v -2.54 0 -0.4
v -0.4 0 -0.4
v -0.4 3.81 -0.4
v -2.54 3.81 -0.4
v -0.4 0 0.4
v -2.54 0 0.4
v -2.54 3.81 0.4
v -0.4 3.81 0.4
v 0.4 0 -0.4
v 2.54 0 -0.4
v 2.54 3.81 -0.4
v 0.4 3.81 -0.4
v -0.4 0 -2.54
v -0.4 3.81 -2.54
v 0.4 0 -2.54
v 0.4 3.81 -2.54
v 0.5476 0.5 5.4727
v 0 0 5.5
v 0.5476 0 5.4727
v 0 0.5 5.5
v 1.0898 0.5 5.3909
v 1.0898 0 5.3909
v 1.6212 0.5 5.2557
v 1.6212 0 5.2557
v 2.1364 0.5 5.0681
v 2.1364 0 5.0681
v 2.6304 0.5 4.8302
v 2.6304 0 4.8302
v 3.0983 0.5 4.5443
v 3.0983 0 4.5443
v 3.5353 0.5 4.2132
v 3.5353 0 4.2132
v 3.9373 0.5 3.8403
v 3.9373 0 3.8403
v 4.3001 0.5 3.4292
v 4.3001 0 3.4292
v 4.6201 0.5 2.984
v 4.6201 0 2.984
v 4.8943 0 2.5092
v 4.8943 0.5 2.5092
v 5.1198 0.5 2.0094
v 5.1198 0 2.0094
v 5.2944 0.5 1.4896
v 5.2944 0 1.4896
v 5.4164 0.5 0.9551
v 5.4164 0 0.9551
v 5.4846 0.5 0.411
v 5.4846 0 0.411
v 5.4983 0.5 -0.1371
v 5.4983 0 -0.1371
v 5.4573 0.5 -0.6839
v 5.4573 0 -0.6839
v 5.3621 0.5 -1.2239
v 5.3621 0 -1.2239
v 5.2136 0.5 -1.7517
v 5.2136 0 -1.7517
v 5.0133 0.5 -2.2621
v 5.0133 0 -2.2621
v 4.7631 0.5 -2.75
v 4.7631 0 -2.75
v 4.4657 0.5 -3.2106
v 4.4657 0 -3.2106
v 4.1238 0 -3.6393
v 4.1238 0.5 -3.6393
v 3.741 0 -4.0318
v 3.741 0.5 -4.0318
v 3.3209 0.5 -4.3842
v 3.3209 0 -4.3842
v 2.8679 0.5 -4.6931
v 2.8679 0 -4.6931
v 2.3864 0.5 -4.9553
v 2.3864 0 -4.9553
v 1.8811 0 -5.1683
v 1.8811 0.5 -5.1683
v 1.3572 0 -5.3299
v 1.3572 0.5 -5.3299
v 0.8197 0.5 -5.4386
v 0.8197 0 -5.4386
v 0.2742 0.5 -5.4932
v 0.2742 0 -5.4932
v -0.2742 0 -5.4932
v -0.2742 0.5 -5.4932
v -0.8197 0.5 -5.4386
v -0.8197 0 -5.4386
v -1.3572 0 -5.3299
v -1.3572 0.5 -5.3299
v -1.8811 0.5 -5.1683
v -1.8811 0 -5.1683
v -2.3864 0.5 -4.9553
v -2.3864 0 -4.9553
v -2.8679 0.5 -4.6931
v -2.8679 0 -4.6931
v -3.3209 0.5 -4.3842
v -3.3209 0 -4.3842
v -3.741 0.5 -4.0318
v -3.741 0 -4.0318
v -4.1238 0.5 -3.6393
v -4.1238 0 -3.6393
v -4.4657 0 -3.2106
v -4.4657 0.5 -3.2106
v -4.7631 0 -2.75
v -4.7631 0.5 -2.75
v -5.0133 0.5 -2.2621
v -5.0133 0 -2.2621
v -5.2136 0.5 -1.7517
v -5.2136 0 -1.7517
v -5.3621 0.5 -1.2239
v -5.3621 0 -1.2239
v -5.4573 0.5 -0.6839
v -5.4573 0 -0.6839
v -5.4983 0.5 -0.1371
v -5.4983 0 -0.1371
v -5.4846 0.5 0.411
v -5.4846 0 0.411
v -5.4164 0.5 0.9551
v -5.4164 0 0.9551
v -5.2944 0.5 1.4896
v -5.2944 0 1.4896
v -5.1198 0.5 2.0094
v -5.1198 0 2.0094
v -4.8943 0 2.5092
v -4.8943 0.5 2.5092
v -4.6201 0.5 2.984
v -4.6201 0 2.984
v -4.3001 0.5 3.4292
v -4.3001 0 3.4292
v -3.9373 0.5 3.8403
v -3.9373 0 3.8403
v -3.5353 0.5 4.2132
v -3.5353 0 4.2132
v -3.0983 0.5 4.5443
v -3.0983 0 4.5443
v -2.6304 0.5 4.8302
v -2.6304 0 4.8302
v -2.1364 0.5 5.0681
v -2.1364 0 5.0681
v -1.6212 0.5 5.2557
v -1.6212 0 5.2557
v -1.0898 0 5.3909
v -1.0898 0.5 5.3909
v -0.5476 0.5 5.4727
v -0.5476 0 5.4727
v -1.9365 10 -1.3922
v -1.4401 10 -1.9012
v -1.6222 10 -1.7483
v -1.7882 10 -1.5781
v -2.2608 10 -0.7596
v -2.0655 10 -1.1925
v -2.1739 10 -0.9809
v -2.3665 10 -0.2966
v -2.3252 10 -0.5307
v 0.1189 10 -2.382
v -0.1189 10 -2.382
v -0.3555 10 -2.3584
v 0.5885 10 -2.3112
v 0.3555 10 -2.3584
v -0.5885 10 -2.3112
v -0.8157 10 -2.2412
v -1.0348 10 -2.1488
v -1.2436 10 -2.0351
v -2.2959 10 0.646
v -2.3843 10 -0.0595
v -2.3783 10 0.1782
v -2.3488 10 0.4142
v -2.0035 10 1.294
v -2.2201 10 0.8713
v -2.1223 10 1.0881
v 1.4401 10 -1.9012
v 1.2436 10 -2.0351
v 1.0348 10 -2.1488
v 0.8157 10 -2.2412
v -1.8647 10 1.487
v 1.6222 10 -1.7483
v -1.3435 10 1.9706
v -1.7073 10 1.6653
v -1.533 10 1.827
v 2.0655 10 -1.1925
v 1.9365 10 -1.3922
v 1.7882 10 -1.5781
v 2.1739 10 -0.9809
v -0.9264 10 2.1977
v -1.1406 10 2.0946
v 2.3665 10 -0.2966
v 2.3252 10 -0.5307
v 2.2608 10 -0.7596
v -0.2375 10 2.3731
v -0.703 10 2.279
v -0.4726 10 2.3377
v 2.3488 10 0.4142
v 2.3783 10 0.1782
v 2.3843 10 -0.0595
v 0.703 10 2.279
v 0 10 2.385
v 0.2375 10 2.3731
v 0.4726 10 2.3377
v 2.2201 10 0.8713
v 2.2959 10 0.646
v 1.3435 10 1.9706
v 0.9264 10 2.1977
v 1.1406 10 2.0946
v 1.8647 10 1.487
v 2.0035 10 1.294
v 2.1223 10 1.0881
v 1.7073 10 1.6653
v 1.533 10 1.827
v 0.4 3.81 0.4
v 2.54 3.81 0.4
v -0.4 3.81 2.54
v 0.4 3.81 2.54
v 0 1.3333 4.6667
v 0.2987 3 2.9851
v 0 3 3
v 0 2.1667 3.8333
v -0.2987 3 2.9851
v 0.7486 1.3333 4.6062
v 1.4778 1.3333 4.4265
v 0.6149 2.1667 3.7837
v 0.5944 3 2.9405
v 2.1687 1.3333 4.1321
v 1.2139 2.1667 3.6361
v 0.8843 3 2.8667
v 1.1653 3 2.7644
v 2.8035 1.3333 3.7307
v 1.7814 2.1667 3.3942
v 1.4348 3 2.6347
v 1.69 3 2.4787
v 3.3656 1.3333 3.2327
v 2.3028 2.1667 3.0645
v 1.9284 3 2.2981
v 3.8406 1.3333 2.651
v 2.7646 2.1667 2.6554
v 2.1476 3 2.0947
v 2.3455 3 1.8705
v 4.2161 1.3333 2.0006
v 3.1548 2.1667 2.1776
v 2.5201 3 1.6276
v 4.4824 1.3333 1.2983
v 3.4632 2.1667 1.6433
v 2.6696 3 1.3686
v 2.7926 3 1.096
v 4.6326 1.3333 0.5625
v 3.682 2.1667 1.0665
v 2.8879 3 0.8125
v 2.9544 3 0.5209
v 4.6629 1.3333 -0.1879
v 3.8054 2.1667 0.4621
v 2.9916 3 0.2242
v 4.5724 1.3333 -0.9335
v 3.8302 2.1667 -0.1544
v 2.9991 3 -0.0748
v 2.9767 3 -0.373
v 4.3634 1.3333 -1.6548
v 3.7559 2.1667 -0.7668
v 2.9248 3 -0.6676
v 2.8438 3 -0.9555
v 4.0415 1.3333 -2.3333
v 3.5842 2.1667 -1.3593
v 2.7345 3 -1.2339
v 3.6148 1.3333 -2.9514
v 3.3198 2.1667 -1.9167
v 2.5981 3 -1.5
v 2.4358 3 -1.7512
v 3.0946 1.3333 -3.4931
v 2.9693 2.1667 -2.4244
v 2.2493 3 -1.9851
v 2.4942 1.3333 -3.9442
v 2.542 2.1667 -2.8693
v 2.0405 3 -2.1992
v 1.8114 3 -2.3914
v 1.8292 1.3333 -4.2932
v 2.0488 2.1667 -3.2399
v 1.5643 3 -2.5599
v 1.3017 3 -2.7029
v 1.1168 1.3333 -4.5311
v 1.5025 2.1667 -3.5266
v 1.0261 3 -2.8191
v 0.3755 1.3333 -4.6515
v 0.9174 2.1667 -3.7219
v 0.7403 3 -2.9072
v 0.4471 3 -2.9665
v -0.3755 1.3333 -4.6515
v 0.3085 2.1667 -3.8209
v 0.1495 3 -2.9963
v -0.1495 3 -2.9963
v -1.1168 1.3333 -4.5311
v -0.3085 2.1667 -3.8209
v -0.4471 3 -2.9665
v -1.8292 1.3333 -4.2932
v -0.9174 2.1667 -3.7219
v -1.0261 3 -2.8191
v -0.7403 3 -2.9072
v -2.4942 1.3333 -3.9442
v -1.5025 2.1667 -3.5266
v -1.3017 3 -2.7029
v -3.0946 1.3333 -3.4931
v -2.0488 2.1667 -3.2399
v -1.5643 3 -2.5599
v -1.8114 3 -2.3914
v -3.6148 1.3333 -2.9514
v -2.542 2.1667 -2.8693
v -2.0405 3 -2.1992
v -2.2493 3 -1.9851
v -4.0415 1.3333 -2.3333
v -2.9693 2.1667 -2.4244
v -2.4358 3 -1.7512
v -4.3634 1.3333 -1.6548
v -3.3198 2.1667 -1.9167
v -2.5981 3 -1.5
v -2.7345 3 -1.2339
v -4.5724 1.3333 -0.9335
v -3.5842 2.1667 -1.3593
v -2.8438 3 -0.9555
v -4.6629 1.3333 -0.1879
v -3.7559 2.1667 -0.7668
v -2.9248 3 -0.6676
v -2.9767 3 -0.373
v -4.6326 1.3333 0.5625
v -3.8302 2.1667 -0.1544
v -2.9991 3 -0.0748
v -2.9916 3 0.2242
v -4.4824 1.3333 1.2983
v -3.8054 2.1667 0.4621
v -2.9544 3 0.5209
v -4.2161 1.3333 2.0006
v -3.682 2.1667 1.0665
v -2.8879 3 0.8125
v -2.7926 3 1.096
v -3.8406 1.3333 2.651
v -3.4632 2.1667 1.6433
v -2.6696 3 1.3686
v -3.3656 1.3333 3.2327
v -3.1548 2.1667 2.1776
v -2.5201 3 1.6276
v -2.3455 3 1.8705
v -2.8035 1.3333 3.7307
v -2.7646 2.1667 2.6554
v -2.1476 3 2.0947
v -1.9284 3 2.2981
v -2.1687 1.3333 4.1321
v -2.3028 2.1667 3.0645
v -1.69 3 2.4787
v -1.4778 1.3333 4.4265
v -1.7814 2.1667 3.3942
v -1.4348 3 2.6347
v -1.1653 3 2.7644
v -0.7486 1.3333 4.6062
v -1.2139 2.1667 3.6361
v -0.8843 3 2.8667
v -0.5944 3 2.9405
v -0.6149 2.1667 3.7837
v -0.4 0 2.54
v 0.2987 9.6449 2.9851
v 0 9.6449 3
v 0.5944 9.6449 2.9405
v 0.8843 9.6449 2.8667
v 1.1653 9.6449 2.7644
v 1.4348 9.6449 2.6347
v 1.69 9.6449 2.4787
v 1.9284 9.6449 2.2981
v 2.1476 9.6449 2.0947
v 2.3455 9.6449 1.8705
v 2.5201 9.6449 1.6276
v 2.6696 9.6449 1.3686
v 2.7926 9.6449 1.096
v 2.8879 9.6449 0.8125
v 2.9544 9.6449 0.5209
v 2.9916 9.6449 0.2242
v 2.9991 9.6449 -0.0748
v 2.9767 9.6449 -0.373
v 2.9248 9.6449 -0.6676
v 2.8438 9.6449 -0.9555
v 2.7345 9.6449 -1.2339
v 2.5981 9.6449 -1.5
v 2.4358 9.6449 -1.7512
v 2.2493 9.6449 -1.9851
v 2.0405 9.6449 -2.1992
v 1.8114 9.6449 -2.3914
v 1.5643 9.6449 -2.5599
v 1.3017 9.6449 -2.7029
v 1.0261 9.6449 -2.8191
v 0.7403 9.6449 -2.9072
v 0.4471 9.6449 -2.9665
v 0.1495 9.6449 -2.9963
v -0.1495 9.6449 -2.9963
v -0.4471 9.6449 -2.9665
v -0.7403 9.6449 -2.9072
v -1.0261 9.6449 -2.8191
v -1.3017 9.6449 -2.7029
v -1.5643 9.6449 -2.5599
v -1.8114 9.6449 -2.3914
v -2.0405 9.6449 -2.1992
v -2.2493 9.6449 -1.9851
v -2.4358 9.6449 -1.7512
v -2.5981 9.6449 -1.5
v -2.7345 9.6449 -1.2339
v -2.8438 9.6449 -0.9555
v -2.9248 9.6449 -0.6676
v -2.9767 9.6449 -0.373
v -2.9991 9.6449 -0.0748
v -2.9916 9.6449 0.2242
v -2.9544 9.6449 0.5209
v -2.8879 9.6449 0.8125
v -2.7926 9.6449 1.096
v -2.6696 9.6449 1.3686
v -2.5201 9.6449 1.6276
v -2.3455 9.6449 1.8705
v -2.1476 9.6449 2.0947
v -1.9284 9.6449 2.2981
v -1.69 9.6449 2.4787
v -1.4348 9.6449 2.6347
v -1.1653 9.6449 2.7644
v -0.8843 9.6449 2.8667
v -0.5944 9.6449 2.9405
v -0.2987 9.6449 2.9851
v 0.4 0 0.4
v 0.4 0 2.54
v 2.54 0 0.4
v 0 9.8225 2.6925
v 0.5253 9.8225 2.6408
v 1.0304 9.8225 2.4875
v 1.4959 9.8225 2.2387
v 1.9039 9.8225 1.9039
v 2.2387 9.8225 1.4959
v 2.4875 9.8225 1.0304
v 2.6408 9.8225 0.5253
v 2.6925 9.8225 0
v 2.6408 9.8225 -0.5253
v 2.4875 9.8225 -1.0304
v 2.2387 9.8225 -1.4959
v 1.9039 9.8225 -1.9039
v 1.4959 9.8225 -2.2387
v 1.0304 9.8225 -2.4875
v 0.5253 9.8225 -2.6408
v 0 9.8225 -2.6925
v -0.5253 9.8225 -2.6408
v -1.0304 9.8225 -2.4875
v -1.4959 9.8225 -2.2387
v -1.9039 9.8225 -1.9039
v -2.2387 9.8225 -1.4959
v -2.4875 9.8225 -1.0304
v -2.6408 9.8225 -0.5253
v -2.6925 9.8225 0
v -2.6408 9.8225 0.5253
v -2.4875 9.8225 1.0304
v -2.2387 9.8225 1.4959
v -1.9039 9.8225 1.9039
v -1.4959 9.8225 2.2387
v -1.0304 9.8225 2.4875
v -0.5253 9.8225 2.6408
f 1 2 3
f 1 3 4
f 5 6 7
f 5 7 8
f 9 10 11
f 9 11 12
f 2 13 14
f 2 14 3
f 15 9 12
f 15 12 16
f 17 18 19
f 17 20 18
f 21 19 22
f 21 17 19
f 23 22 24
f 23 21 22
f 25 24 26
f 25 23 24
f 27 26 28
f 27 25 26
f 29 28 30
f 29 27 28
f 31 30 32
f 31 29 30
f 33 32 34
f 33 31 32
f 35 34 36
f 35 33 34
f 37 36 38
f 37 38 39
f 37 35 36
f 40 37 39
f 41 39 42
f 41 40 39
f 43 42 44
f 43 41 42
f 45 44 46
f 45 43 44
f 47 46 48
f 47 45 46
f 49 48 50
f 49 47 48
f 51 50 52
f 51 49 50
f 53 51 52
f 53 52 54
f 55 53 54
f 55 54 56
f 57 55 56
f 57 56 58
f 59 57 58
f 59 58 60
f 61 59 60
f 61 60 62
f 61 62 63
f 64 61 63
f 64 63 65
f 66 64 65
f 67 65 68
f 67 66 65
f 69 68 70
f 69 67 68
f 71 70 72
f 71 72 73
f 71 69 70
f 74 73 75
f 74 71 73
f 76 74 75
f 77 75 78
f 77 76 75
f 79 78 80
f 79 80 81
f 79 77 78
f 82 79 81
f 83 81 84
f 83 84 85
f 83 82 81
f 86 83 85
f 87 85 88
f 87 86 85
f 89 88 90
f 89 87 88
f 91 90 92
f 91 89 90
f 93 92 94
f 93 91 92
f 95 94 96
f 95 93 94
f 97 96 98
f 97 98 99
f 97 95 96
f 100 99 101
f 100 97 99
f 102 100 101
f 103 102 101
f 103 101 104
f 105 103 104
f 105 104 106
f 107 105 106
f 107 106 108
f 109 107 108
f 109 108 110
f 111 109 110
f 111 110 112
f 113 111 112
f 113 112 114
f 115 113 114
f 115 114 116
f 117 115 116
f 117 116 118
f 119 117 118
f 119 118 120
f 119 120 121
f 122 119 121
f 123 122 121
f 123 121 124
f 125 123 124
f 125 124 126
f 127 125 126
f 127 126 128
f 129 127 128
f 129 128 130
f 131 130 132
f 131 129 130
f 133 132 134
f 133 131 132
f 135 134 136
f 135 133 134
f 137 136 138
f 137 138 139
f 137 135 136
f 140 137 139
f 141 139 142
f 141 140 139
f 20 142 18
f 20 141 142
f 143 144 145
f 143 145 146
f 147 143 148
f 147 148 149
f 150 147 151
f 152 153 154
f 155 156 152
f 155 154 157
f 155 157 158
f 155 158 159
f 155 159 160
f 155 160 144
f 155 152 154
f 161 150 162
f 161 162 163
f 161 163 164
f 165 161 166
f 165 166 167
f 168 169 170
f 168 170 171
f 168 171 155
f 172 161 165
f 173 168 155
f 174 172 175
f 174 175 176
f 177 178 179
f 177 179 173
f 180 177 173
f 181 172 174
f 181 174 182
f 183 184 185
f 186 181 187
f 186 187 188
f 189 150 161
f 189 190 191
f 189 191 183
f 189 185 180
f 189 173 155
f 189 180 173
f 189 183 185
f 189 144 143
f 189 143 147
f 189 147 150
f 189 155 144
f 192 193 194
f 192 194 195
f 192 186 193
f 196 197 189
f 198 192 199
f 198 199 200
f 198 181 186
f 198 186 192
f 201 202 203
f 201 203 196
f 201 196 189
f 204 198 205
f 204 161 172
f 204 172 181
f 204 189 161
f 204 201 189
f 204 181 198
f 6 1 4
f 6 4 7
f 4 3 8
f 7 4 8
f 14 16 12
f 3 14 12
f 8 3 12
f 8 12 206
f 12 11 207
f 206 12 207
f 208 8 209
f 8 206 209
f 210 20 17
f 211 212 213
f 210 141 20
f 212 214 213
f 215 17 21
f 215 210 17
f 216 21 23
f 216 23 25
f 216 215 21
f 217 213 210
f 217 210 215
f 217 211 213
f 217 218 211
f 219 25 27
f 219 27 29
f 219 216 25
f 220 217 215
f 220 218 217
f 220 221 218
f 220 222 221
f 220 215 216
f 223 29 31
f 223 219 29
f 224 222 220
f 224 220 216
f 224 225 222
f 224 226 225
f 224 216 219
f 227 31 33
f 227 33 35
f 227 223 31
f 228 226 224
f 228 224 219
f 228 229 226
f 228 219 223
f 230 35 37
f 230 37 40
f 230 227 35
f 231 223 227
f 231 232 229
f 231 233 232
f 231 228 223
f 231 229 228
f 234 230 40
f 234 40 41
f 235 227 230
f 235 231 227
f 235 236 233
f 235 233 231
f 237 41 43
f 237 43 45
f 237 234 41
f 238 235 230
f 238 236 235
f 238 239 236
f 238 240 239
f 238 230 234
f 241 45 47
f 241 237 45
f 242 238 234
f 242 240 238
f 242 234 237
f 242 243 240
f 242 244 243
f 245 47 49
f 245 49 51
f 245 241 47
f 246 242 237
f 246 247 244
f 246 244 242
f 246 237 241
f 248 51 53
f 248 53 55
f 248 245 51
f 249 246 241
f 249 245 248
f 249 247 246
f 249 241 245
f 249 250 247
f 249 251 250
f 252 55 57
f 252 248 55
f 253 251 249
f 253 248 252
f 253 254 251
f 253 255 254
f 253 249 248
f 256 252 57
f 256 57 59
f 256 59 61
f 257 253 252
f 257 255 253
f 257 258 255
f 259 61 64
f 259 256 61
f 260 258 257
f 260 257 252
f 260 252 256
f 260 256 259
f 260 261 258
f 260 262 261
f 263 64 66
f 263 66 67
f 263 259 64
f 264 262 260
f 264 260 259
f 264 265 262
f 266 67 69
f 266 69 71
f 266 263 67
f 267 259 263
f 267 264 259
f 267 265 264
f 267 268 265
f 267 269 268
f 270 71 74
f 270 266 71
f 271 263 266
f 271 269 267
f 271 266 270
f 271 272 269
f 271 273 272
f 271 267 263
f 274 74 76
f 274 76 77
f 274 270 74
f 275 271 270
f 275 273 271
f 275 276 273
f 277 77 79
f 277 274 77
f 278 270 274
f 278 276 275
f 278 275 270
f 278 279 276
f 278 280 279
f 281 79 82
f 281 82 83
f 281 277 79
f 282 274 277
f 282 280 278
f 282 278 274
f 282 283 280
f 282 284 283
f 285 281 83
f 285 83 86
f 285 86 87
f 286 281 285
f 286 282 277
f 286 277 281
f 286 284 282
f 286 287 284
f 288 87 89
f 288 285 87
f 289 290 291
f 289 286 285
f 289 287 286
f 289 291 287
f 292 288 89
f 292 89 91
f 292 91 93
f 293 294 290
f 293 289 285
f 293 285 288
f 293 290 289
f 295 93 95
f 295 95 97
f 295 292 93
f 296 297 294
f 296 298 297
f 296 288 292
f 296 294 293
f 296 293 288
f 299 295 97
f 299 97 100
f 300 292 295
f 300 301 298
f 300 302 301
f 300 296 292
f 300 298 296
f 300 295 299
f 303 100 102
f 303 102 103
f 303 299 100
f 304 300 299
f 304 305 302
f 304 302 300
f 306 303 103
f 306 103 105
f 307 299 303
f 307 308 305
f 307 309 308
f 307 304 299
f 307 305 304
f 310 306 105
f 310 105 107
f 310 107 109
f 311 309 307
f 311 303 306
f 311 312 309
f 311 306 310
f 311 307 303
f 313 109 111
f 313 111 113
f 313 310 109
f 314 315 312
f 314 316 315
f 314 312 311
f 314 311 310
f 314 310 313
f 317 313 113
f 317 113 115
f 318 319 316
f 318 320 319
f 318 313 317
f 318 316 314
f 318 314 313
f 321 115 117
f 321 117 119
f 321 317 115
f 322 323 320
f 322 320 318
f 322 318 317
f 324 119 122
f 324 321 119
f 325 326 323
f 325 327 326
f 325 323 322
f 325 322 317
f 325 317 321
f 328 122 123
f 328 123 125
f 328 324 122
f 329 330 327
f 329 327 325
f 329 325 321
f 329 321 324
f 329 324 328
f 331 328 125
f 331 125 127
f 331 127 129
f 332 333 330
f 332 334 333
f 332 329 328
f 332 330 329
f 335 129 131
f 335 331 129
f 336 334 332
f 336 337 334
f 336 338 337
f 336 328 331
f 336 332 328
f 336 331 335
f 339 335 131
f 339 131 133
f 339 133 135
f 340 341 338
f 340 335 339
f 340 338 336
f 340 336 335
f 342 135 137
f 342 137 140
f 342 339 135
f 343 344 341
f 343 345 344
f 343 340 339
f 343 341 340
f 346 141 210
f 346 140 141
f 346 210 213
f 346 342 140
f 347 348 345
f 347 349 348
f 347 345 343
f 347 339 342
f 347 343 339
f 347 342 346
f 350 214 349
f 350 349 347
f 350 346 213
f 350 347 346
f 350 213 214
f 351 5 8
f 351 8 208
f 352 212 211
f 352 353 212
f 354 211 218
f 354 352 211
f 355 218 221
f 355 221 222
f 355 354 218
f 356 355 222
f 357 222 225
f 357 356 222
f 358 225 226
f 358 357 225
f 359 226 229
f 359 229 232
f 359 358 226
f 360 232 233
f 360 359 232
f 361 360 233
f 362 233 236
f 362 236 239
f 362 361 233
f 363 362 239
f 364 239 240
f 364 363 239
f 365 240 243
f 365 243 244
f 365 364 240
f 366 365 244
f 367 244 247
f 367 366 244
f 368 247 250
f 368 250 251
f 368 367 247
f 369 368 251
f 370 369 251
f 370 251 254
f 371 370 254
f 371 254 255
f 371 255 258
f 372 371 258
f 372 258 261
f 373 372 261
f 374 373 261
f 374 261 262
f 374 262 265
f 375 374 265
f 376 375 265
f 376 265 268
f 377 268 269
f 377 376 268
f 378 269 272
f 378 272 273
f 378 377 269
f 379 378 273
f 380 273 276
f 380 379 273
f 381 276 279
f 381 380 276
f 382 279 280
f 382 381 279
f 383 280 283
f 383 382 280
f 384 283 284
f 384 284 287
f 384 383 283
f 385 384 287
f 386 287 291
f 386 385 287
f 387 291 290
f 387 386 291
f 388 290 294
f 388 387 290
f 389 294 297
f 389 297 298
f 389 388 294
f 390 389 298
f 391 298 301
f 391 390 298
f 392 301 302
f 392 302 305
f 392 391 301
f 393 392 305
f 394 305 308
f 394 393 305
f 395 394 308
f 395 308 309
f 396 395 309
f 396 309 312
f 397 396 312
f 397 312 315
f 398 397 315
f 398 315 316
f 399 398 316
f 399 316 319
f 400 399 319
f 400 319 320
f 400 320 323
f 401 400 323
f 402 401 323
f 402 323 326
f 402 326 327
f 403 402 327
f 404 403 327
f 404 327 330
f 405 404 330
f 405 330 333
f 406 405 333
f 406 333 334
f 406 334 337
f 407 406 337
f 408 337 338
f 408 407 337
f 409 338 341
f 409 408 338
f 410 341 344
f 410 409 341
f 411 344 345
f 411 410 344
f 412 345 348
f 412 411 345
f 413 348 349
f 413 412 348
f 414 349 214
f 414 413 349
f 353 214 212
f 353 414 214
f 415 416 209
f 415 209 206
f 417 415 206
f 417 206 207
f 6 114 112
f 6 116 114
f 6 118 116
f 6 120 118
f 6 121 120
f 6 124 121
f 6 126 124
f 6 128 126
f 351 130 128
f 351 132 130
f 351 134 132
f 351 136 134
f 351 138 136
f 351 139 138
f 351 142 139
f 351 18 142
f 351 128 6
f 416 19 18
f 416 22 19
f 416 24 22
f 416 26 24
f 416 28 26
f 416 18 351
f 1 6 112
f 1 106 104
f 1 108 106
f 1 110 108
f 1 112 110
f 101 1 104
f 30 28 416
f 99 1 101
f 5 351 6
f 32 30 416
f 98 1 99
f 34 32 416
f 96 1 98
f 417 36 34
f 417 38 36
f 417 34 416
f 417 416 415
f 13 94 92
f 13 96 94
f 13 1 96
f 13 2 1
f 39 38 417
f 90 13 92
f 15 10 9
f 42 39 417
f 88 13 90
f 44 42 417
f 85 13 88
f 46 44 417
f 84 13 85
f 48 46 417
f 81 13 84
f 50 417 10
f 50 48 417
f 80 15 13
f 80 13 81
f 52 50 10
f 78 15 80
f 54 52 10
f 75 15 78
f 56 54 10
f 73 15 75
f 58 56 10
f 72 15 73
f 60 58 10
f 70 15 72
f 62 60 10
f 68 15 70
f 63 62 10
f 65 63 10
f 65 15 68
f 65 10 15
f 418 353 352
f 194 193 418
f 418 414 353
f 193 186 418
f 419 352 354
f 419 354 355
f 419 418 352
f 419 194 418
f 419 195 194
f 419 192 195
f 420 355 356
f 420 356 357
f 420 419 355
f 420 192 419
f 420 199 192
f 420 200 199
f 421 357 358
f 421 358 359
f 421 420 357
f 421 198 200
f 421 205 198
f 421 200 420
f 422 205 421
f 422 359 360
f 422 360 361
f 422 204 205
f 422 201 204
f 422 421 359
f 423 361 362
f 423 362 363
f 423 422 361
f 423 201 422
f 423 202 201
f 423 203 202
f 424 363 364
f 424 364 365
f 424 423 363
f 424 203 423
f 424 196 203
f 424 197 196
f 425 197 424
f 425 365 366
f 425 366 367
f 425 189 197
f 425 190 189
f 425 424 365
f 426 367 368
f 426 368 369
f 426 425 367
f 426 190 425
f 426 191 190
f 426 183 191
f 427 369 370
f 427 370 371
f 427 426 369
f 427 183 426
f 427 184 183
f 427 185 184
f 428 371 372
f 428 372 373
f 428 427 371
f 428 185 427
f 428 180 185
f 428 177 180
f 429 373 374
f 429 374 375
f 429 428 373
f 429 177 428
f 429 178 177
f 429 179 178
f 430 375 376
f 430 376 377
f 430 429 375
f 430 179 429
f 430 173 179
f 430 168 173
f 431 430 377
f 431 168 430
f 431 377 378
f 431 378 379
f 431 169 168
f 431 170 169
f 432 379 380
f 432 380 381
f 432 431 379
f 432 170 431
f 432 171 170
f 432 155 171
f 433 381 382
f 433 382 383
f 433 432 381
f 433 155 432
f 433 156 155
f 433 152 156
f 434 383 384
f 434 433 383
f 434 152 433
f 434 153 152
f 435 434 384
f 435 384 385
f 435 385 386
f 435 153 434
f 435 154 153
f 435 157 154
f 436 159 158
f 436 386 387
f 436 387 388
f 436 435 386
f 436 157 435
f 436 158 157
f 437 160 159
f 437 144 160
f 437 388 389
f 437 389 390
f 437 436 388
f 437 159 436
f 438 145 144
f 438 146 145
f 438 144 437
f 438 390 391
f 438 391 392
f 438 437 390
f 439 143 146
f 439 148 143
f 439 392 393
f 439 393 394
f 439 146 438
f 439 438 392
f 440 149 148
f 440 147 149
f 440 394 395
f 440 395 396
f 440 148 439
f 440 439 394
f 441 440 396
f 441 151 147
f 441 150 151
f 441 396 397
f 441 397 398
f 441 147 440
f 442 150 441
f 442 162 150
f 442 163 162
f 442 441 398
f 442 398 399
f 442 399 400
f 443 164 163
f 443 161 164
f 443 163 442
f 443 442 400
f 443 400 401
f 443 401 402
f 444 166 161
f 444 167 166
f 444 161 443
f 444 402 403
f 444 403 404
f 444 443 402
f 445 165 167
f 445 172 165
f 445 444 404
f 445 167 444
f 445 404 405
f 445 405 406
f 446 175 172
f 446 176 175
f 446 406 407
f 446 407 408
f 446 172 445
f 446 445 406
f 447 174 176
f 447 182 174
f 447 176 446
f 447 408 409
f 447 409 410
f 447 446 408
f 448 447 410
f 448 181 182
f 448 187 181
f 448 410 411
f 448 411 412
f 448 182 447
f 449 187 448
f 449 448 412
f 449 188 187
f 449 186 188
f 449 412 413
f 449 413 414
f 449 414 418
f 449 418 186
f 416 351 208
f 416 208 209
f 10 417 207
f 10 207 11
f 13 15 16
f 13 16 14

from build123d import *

# Parameters (mm, degrees)
POCKET_DEPTH = 3.81


with BuildPart() as part:
    # Sketch → Revolution (revolve)
    with BuildSketch(Plane.YZ):
        Polygon((0, 0), (0, 5.5), (0.5, 5.5), (3, 3), (9.64493, 3), (10, 2.385), (10, 0), align=None)
    revolve(axis=Axis((0, 0, 0), (0, 1, 0)))

    # Sketch001 → Pocket (cut)
    with BuildSketch(Plane(origin=(0, 0, 0), x_dir=(0, 0, -1), z_dir=(0, -1, 0))):
        Polygon((-2.54, 0.4), (-0.4, 0.4), (-0.4, 2.54), (0.4, 2.54), (0.4, 0.4), (2.54, 0.4), (2.54, -0.4), (0.4, -0.4), (0.4, -2.54), (-0.4, -2.54), (-0.4, -0.4), (-2.54, -0.4), align=None)
    extrude(amount=-POCKET_DEPTH, mode=Mode.SUBTRACT)


solid = part.part
